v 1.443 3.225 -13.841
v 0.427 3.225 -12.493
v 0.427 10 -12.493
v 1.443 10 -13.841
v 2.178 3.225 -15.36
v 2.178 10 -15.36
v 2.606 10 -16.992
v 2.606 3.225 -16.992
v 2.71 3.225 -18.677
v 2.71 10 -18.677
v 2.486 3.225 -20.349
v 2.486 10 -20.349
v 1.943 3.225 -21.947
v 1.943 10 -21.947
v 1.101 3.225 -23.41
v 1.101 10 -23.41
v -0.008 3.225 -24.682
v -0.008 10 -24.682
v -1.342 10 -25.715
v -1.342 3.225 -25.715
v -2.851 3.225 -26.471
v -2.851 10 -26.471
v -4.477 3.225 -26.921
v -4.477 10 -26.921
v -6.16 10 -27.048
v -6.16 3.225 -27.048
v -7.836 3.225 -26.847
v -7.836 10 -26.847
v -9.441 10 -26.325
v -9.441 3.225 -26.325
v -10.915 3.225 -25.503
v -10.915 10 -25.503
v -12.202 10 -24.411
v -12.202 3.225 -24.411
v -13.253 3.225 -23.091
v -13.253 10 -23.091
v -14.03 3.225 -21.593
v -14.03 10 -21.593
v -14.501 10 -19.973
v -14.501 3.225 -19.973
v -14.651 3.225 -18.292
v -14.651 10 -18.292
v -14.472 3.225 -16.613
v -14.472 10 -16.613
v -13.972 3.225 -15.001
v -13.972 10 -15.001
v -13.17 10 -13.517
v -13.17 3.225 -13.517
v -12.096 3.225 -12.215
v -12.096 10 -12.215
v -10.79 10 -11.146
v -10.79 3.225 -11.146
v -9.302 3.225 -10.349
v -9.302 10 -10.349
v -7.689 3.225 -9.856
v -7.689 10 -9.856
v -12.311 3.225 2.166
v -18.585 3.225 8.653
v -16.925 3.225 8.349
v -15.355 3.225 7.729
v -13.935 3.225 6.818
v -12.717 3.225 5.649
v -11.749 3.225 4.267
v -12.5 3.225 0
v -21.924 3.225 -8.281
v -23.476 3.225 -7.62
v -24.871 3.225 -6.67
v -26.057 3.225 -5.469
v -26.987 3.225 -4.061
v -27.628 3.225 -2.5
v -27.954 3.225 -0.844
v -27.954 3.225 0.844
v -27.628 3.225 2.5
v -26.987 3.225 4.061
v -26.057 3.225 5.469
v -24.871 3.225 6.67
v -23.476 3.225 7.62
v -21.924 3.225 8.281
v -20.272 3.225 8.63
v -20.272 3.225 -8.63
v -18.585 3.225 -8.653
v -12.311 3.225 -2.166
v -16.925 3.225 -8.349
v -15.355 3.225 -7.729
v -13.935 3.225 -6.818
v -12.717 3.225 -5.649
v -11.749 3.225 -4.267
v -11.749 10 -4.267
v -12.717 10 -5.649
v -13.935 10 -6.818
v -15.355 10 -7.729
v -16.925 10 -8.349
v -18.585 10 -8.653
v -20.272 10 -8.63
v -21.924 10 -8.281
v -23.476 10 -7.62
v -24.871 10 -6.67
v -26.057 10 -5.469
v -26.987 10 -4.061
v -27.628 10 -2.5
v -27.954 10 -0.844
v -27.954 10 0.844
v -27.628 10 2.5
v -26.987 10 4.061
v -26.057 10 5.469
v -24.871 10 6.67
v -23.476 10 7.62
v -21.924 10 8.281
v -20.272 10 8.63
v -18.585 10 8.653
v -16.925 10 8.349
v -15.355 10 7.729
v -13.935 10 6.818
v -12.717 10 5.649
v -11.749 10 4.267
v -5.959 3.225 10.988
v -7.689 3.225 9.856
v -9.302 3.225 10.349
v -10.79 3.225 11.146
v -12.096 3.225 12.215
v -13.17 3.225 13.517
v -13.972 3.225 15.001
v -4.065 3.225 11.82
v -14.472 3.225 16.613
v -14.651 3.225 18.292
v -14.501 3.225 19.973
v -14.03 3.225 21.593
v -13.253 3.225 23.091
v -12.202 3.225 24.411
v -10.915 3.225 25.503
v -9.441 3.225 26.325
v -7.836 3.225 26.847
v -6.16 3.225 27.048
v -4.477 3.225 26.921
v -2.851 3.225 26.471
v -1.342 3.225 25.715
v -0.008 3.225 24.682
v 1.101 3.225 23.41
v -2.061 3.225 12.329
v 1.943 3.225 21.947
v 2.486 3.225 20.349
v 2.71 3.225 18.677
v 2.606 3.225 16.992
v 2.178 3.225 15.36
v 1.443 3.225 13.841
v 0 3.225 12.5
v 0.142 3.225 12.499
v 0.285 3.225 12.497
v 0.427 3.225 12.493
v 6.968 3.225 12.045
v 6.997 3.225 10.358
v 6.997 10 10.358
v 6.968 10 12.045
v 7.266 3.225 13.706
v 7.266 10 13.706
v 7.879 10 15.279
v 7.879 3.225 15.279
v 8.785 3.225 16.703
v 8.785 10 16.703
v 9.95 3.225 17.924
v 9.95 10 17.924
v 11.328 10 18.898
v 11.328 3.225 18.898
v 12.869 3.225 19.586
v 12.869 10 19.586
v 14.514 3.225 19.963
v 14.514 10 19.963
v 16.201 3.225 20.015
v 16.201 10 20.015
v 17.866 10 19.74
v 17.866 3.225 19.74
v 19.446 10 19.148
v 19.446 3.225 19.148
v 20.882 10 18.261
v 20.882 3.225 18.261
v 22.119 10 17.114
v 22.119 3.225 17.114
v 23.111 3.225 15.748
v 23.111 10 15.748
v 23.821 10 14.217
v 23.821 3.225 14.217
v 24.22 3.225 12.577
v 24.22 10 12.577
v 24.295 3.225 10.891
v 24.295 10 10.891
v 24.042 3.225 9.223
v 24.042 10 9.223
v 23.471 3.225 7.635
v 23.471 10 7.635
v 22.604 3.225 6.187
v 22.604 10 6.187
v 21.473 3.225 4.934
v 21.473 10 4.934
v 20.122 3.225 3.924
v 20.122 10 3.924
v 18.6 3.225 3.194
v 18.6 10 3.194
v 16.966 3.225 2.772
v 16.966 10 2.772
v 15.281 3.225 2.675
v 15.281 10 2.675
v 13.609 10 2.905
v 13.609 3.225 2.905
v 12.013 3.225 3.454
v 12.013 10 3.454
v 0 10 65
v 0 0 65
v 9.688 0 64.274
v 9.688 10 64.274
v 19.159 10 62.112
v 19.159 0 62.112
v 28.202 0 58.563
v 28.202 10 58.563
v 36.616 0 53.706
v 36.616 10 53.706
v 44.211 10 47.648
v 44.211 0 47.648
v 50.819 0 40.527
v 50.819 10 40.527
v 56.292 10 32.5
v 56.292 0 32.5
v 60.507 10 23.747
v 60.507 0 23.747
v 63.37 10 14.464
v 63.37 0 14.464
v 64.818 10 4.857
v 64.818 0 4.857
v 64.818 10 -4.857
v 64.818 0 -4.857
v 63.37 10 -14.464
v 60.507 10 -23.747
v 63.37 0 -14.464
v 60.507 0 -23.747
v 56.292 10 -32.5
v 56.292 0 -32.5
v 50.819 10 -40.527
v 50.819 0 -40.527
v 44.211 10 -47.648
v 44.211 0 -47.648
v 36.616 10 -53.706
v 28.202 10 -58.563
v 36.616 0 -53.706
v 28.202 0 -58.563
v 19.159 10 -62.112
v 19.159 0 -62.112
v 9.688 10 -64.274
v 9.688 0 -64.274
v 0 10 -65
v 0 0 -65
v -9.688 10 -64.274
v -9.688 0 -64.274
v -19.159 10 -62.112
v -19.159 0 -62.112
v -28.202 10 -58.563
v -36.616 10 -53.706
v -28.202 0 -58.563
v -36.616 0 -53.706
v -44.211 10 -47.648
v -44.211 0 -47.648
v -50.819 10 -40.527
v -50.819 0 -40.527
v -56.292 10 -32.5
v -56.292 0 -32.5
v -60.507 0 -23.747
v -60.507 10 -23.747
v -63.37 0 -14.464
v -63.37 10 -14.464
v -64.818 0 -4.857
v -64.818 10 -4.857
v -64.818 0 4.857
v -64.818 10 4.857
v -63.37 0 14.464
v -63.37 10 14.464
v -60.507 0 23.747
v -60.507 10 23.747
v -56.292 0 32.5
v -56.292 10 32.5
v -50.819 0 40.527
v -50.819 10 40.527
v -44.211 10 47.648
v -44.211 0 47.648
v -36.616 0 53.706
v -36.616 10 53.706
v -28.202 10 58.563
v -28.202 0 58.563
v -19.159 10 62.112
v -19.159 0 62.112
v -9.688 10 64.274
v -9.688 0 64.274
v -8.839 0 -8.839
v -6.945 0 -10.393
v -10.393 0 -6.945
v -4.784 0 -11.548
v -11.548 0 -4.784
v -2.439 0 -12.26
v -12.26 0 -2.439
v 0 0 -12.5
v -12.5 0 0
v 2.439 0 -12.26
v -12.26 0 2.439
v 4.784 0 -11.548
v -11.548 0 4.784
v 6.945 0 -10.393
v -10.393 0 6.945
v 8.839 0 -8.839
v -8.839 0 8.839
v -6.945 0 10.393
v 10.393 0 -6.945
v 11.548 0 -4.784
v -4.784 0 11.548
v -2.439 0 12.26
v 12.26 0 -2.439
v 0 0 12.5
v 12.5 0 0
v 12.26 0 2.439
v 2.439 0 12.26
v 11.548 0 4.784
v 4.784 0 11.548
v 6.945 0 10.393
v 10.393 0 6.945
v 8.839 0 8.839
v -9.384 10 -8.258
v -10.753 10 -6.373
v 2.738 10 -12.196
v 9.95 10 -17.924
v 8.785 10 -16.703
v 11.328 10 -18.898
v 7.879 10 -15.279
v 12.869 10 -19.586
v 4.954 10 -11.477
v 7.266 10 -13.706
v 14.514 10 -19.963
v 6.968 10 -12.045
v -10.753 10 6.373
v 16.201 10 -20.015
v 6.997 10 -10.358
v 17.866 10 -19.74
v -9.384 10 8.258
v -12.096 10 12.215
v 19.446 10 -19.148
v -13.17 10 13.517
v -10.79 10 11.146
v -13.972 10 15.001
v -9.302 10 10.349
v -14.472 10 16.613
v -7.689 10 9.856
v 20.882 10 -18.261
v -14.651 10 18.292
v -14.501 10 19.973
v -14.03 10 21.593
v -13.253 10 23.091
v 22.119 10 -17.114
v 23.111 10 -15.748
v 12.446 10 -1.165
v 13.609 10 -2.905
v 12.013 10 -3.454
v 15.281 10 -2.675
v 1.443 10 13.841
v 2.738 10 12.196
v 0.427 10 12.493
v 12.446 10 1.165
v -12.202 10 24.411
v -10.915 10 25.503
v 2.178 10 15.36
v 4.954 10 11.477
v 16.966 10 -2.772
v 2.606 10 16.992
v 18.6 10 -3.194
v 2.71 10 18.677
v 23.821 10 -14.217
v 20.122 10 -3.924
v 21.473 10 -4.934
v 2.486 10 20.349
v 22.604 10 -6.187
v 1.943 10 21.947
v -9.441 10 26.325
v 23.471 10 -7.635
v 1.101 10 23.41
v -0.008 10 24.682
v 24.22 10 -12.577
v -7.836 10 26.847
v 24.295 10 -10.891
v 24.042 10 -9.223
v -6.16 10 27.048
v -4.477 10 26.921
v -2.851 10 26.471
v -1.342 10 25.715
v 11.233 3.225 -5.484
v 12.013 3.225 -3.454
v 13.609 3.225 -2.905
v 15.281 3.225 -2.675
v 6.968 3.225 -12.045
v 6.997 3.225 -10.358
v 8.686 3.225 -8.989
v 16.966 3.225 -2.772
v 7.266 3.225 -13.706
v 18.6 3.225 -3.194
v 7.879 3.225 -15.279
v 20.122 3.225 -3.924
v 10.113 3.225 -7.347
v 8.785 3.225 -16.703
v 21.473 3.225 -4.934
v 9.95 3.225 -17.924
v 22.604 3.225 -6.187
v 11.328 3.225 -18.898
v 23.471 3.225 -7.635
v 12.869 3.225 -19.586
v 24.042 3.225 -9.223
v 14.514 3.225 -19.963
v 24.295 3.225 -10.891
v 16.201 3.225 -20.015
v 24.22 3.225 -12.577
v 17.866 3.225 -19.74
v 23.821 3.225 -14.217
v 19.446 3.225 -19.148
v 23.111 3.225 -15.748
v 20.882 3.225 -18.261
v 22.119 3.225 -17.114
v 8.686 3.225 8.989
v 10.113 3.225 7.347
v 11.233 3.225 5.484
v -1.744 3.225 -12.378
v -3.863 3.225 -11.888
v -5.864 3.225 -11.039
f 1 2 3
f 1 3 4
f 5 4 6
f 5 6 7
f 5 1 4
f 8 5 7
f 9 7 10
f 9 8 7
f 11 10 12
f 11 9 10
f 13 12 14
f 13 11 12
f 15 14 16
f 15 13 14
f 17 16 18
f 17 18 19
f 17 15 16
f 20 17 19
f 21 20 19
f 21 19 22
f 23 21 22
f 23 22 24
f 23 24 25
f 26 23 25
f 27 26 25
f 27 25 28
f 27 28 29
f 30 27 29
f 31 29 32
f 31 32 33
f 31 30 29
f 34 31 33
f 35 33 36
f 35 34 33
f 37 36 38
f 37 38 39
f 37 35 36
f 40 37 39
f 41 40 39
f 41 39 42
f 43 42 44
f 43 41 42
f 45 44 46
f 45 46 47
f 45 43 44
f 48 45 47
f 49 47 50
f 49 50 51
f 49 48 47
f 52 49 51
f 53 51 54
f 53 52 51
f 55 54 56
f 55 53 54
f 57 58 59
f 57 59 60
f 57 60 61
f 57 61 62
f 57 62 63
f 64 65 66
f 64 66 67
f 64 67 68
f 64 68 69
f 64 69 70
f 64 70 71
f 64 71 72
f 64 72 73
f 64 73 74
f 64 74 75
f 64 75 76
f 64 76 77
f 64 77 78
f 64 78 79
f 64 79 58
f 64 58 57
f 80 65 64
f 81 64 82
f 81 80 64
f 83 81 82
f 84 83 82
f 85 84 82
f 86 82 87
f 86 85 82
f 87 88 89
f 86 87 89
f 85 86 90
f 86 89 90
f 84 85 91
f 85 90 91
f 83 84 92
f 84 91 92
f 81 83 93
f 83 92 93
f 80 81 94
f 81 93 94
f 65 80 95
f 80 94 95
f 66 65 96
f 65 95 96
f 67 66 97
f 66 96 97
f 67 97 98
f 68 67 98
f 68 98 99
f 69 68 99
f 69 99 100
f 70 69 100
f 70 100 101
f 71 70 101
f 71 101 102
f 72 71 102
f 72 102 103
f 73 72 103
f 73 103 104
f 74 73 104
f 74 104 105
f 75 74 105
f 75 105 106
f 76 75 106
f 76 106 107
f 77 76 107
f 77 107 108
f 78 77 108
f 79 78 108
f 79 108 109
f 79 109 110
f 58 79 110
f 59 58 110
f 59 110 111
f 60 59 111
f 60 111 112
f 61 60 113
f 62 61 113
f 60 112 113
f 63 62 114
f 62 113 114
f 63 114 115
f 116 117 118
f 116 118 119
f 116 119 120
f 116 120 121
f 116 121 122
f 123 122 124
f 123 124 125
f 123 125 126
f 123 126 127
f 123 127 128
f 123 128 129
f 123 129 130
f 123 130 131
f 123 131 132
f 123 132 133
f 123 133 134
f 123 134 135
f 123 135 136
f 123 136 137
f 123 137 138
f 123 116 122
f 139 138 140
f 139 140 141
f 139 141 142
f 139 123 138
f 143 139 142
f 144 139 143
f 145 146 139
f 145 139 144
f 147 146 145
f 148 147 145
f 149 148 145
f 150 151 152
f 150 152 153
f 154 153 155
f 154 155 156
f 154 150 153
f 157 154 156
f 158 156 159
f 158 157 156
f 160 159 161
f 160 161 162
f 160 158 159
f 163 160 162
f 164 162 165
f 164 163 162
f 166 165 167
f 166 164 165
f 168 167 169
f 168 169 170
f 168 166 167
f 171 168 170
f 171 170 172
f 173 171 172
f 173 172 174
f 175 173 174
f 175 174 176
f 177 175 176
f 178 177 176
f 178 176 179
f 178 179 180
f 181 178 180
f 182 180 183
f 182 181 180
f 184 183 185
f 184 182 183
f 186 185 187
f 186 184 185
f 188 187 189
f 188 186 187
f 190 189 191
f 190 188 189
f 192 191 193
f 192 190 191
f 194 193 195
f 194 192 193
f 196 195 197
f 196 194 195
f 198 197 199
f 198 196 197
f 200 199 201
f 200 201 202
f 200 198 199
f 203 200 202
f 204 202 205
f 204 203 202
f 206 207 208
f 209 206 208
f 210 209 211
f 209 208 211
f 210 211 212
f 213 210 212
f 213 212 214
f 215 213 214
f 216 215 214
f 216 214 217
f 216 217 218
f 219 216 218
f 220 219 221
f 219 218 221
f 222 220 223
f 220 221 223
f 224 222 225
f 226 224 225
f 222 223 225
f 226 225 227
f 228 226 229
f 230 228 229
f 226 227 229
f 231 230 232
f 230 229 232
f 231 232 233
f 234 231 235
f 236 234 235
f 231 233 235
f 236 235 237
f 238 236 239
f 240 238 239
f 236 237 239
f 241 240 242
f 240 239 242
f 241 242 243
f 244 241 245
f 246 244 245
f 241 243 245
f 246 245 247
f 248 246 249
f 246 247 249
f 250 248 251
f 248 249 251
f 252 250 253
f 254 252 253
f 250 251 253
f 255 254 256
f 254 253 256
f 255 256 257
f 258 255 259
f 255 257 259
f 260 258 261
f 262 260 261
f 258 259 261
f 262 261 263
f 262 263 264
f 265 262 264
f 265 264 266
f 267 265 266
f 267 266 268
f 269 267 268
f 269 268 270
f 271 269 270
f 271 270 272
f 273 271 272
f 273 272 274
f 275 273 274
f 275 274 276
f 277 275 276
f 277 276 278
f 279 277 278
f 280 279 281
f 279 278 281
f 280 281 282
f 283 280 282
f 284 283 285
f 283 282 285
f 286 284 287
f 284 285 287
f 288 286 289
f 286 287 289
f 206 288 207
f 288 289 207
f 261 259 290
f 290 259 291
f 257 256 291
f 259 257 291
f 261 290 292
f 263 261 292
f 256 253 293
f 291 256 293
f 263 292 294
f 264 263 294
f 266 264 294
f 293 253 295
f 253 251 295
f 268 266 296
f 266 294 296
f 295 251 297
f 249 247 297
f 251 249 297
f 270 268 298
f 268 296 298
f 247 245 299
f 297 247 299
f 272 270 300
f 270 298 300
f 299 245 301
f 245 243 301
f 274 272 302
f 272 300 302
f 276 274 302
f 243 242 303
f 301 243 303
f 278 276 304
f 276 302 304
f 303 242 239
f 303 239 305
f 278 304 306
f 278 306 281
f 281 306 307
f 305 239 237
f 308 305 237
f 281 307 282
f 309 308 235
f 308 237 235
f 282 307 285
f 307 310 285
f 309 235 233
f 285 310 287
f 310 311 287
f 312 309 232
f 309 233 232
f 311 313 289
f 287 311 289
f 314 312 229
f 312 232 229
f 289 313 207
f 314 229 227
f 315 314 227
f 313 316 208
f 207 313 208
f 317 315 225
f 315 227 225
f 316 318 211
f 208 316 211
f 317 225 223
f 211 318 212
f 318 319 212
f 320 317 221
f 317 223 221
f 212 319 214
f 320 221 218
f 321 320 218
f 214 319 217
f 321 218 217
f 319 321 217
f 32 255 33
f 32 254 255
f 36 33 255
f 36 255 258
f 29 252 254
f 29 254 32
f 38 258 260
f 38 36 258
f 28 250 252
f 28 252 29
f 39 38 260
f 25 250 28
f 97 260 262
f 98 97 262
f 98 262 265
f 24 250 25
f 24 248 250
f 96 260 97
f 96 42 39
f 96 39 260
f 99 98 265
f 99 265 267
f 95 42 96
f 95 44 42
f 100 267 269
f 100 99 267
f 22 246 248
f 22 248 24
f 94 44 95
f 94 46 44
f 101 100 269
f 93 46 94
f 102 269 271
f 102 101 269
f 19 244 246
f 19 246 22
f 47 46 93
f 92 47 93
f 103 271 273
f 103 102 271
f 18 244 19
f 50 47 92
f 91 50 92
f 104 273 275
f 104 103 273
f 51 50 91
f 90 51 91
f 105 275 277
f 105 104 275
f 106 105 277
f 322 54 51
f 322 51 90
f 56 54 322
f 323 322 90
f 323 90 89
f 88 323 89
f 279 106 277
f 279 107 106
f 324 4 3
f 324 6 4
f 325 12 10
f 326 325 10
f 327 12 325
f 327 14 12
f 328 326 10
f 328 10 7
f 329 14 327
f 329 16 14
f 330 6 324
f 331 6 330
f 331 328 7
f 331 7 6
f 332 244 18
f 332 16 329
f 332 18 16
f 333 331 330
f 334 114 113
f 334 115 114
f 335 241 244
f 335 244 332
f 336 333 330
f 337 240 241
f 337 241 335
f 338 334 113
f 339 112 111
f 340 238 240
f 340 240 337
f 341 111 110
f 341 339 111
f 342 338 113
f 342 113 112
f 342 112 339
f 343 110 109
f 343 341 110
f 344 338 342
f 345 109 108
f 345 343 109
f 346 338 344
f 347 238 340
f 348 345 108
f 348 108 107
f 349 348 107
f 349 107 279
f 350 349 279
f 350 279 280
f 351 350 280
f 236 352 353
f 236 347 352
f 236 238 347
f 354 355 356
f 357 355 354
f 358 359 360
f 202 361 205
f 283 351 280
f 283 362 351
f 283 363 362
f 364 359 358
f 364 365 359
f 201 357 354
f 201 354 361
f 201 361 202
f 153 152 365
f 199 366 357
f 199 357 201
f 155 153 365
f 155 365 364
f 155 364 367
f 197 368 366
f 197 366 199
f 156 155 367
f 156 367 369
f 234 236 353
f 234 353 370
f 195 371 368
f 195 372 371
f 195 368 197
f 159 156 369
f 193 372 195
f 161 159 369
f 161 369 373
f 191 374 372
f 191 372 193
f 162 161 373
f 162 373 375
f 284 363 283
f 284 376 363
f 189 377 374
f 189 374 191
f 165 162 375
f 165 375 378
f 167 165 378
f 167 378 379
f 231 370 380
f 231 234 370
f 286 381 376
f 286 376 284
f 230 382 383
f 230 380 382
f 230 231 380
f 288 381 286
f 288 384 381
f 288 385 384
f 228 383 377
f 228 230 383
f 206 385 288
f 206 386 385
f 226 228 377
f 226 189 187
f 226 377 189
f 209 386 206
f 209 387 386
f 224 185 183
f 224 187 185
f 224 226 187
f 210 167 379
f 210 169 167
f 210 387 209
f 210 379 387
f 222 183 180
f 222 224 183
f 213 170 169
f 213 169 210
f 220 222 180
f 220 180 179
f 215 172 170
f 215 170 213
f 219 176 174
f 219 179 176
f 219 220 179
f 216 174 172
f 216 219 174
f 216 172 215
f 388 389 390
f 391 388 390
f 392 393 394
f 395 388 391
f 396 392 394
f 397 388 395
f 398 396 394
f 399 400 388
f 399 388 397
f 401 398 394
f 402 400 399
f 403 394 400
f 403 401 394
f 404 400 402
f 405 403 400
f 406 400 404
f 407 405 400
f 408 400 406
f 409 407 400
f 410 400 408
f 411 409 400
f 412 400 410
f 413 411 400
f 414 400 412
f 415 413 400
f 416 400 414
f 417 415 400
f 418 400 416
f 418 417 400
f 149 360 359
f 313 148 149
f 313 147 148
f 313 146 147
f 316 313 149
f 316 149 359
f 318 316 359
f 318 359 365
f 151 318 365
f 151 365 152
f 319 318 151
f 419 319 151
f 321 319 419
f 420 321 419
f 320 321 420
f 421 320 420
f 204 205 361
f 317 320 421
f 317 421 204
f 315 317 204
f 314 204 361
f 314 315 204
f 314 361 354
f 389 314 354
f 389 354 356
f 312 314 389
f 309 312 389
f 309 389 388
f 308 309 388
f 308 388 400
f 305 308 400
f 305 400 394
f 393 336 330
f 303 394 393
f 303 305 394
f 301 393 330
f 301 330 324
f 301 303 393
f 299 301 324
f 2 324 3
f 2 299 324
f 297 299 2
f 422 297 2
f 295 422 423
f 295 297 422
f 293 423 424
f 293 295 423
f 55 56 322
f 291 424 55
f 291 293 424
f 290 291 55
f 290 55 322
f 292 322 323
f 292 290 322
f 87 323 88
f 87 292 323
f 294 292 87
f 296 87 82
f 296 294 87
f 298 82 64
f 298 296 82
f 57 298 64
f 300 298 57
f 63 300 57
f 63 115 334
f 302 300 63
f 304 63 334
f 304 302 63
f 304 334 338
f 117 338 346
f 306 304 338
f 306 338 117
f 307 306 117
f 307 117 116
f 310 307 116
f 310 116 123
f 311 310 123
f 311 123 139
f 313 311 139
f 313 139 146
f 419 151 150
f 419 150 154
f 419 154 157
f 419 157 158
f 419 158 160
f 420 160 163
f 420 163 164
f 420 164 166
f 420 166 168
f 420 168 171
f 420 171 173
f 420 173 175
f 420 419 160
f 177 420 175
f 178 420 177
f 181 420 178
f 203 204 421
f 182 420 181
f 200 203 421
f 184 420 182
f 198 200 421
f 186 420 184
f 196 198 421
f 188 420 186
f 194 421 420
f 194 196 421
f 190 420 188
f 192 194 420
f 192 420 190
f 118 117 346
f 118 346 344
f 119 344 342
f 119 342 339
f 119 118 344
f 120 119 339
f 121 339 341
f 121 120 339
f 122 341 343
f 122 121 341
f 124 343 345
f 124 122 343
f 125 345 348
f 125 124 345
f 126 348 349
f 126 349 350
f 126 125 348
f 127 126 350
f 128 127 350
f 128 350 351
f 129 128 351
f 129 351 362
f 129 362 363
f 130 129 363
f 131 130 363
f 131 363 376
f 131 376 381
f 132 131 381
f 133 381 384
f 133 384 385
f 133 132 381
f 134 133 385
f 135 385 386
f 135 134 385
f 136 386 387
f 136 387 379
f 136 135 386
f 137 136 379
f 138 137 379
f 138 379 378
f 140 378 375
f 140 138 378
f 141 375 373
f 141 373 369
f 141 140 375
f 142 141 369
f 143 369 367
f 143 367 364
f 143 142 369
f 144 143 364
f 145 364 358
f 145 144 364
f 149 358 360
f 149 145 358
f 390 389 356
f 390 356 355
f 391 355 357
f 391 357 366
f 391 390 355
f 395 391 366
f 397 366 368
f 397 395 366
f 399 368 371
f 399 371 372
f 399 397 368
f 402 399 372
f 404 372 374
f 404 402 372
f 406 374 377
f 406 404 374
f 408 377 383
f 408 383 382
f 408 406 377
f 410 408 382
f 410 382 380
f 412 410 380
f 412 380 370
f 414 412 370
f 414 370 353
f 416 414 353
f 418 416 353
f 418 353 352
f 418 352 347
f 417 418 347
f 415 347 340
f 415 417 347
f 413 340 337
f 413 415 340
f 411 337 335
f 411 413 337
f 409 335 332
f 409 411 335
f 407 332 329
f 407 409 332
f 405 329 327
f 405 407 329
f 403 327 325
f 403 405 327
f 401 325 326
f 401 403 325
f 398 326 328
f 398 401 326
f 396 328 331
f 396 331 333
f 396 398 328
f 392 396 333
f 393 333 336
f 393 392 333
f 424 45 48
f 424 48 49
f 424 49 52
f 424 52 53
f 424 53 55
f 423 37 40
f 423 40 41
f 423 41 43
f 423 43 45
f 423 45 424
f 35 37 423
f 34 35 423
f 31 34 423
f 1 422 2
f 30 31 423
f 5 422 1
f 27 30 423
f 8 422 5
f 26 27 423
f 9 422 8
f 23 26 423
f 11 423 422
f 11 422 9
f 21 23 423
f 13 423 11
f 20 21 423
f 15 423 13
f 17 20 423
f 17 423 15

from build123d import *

# Parameters (mm, degrees)
SKETCH1_R           = 65
BOSS_EXTRUDE1_DEPTH = 10
SKETCH2_R           = 12.5
CUT_EXTRUDE1_DEPTH  = 93.466210045
SKETCH3_R           = 8.683348951
CUT_EXTRUDE2_DEPTH  = 6.774962278
CIRPATTERN1_COUNT   = 5


with BuildPart() as part:
    # Sketch1 → Boss-Extrude1 (new body)
    with BuildSketch(Plane(origin=(0, 0, 0), x_dir=(1, 0, 0), z_dir=(0, 1, 0))):
        Circle(SKETCH1_R)
    extrude(amount=BOSS_EXTRUDE1_DEPTH)

    # Sketch2 → Cut-Extrude1 (cut, through all)
    with BuildSketch(Plane(origin=(0, 0, 0), x_dir=(1, 0, 0), z_dir=(0, 1, 0))):
        Circle(SKETCH2_R)
    extrude(amount=CUT_EXTRUDE1_DEPTH, mode=Mode.SUBTRACT)

    # Sketch3 → Cut-Extrude2 (cut)
    with BuildSketch(Plane(origin=(0, 10, 0), x_dir=(1, 0, 0), z_dir=(0, 1, 0))):
        with Locations((-19.31200649, 0)):
            Circle(SKETCH3_R)
    cut_extrude2 = extrude(amount=-CUT_EXTRUDE2_DEPTH, mode=Mode.SUBTRACT)

    # CirPattern1: Cut-Extrude2 ×5 about axis
    cirpattern1_axis = Axis((0, 0, 0), (0, 1, 0))
    for i in range(1, CIRPATTERN1_COUNT):
        add(cut_extrude2.rotate(cirpattern1_axis, i * 360 / CIRPATTERN1_COUNT), mode=Mode.SUBTRACT)


solid = part.part
